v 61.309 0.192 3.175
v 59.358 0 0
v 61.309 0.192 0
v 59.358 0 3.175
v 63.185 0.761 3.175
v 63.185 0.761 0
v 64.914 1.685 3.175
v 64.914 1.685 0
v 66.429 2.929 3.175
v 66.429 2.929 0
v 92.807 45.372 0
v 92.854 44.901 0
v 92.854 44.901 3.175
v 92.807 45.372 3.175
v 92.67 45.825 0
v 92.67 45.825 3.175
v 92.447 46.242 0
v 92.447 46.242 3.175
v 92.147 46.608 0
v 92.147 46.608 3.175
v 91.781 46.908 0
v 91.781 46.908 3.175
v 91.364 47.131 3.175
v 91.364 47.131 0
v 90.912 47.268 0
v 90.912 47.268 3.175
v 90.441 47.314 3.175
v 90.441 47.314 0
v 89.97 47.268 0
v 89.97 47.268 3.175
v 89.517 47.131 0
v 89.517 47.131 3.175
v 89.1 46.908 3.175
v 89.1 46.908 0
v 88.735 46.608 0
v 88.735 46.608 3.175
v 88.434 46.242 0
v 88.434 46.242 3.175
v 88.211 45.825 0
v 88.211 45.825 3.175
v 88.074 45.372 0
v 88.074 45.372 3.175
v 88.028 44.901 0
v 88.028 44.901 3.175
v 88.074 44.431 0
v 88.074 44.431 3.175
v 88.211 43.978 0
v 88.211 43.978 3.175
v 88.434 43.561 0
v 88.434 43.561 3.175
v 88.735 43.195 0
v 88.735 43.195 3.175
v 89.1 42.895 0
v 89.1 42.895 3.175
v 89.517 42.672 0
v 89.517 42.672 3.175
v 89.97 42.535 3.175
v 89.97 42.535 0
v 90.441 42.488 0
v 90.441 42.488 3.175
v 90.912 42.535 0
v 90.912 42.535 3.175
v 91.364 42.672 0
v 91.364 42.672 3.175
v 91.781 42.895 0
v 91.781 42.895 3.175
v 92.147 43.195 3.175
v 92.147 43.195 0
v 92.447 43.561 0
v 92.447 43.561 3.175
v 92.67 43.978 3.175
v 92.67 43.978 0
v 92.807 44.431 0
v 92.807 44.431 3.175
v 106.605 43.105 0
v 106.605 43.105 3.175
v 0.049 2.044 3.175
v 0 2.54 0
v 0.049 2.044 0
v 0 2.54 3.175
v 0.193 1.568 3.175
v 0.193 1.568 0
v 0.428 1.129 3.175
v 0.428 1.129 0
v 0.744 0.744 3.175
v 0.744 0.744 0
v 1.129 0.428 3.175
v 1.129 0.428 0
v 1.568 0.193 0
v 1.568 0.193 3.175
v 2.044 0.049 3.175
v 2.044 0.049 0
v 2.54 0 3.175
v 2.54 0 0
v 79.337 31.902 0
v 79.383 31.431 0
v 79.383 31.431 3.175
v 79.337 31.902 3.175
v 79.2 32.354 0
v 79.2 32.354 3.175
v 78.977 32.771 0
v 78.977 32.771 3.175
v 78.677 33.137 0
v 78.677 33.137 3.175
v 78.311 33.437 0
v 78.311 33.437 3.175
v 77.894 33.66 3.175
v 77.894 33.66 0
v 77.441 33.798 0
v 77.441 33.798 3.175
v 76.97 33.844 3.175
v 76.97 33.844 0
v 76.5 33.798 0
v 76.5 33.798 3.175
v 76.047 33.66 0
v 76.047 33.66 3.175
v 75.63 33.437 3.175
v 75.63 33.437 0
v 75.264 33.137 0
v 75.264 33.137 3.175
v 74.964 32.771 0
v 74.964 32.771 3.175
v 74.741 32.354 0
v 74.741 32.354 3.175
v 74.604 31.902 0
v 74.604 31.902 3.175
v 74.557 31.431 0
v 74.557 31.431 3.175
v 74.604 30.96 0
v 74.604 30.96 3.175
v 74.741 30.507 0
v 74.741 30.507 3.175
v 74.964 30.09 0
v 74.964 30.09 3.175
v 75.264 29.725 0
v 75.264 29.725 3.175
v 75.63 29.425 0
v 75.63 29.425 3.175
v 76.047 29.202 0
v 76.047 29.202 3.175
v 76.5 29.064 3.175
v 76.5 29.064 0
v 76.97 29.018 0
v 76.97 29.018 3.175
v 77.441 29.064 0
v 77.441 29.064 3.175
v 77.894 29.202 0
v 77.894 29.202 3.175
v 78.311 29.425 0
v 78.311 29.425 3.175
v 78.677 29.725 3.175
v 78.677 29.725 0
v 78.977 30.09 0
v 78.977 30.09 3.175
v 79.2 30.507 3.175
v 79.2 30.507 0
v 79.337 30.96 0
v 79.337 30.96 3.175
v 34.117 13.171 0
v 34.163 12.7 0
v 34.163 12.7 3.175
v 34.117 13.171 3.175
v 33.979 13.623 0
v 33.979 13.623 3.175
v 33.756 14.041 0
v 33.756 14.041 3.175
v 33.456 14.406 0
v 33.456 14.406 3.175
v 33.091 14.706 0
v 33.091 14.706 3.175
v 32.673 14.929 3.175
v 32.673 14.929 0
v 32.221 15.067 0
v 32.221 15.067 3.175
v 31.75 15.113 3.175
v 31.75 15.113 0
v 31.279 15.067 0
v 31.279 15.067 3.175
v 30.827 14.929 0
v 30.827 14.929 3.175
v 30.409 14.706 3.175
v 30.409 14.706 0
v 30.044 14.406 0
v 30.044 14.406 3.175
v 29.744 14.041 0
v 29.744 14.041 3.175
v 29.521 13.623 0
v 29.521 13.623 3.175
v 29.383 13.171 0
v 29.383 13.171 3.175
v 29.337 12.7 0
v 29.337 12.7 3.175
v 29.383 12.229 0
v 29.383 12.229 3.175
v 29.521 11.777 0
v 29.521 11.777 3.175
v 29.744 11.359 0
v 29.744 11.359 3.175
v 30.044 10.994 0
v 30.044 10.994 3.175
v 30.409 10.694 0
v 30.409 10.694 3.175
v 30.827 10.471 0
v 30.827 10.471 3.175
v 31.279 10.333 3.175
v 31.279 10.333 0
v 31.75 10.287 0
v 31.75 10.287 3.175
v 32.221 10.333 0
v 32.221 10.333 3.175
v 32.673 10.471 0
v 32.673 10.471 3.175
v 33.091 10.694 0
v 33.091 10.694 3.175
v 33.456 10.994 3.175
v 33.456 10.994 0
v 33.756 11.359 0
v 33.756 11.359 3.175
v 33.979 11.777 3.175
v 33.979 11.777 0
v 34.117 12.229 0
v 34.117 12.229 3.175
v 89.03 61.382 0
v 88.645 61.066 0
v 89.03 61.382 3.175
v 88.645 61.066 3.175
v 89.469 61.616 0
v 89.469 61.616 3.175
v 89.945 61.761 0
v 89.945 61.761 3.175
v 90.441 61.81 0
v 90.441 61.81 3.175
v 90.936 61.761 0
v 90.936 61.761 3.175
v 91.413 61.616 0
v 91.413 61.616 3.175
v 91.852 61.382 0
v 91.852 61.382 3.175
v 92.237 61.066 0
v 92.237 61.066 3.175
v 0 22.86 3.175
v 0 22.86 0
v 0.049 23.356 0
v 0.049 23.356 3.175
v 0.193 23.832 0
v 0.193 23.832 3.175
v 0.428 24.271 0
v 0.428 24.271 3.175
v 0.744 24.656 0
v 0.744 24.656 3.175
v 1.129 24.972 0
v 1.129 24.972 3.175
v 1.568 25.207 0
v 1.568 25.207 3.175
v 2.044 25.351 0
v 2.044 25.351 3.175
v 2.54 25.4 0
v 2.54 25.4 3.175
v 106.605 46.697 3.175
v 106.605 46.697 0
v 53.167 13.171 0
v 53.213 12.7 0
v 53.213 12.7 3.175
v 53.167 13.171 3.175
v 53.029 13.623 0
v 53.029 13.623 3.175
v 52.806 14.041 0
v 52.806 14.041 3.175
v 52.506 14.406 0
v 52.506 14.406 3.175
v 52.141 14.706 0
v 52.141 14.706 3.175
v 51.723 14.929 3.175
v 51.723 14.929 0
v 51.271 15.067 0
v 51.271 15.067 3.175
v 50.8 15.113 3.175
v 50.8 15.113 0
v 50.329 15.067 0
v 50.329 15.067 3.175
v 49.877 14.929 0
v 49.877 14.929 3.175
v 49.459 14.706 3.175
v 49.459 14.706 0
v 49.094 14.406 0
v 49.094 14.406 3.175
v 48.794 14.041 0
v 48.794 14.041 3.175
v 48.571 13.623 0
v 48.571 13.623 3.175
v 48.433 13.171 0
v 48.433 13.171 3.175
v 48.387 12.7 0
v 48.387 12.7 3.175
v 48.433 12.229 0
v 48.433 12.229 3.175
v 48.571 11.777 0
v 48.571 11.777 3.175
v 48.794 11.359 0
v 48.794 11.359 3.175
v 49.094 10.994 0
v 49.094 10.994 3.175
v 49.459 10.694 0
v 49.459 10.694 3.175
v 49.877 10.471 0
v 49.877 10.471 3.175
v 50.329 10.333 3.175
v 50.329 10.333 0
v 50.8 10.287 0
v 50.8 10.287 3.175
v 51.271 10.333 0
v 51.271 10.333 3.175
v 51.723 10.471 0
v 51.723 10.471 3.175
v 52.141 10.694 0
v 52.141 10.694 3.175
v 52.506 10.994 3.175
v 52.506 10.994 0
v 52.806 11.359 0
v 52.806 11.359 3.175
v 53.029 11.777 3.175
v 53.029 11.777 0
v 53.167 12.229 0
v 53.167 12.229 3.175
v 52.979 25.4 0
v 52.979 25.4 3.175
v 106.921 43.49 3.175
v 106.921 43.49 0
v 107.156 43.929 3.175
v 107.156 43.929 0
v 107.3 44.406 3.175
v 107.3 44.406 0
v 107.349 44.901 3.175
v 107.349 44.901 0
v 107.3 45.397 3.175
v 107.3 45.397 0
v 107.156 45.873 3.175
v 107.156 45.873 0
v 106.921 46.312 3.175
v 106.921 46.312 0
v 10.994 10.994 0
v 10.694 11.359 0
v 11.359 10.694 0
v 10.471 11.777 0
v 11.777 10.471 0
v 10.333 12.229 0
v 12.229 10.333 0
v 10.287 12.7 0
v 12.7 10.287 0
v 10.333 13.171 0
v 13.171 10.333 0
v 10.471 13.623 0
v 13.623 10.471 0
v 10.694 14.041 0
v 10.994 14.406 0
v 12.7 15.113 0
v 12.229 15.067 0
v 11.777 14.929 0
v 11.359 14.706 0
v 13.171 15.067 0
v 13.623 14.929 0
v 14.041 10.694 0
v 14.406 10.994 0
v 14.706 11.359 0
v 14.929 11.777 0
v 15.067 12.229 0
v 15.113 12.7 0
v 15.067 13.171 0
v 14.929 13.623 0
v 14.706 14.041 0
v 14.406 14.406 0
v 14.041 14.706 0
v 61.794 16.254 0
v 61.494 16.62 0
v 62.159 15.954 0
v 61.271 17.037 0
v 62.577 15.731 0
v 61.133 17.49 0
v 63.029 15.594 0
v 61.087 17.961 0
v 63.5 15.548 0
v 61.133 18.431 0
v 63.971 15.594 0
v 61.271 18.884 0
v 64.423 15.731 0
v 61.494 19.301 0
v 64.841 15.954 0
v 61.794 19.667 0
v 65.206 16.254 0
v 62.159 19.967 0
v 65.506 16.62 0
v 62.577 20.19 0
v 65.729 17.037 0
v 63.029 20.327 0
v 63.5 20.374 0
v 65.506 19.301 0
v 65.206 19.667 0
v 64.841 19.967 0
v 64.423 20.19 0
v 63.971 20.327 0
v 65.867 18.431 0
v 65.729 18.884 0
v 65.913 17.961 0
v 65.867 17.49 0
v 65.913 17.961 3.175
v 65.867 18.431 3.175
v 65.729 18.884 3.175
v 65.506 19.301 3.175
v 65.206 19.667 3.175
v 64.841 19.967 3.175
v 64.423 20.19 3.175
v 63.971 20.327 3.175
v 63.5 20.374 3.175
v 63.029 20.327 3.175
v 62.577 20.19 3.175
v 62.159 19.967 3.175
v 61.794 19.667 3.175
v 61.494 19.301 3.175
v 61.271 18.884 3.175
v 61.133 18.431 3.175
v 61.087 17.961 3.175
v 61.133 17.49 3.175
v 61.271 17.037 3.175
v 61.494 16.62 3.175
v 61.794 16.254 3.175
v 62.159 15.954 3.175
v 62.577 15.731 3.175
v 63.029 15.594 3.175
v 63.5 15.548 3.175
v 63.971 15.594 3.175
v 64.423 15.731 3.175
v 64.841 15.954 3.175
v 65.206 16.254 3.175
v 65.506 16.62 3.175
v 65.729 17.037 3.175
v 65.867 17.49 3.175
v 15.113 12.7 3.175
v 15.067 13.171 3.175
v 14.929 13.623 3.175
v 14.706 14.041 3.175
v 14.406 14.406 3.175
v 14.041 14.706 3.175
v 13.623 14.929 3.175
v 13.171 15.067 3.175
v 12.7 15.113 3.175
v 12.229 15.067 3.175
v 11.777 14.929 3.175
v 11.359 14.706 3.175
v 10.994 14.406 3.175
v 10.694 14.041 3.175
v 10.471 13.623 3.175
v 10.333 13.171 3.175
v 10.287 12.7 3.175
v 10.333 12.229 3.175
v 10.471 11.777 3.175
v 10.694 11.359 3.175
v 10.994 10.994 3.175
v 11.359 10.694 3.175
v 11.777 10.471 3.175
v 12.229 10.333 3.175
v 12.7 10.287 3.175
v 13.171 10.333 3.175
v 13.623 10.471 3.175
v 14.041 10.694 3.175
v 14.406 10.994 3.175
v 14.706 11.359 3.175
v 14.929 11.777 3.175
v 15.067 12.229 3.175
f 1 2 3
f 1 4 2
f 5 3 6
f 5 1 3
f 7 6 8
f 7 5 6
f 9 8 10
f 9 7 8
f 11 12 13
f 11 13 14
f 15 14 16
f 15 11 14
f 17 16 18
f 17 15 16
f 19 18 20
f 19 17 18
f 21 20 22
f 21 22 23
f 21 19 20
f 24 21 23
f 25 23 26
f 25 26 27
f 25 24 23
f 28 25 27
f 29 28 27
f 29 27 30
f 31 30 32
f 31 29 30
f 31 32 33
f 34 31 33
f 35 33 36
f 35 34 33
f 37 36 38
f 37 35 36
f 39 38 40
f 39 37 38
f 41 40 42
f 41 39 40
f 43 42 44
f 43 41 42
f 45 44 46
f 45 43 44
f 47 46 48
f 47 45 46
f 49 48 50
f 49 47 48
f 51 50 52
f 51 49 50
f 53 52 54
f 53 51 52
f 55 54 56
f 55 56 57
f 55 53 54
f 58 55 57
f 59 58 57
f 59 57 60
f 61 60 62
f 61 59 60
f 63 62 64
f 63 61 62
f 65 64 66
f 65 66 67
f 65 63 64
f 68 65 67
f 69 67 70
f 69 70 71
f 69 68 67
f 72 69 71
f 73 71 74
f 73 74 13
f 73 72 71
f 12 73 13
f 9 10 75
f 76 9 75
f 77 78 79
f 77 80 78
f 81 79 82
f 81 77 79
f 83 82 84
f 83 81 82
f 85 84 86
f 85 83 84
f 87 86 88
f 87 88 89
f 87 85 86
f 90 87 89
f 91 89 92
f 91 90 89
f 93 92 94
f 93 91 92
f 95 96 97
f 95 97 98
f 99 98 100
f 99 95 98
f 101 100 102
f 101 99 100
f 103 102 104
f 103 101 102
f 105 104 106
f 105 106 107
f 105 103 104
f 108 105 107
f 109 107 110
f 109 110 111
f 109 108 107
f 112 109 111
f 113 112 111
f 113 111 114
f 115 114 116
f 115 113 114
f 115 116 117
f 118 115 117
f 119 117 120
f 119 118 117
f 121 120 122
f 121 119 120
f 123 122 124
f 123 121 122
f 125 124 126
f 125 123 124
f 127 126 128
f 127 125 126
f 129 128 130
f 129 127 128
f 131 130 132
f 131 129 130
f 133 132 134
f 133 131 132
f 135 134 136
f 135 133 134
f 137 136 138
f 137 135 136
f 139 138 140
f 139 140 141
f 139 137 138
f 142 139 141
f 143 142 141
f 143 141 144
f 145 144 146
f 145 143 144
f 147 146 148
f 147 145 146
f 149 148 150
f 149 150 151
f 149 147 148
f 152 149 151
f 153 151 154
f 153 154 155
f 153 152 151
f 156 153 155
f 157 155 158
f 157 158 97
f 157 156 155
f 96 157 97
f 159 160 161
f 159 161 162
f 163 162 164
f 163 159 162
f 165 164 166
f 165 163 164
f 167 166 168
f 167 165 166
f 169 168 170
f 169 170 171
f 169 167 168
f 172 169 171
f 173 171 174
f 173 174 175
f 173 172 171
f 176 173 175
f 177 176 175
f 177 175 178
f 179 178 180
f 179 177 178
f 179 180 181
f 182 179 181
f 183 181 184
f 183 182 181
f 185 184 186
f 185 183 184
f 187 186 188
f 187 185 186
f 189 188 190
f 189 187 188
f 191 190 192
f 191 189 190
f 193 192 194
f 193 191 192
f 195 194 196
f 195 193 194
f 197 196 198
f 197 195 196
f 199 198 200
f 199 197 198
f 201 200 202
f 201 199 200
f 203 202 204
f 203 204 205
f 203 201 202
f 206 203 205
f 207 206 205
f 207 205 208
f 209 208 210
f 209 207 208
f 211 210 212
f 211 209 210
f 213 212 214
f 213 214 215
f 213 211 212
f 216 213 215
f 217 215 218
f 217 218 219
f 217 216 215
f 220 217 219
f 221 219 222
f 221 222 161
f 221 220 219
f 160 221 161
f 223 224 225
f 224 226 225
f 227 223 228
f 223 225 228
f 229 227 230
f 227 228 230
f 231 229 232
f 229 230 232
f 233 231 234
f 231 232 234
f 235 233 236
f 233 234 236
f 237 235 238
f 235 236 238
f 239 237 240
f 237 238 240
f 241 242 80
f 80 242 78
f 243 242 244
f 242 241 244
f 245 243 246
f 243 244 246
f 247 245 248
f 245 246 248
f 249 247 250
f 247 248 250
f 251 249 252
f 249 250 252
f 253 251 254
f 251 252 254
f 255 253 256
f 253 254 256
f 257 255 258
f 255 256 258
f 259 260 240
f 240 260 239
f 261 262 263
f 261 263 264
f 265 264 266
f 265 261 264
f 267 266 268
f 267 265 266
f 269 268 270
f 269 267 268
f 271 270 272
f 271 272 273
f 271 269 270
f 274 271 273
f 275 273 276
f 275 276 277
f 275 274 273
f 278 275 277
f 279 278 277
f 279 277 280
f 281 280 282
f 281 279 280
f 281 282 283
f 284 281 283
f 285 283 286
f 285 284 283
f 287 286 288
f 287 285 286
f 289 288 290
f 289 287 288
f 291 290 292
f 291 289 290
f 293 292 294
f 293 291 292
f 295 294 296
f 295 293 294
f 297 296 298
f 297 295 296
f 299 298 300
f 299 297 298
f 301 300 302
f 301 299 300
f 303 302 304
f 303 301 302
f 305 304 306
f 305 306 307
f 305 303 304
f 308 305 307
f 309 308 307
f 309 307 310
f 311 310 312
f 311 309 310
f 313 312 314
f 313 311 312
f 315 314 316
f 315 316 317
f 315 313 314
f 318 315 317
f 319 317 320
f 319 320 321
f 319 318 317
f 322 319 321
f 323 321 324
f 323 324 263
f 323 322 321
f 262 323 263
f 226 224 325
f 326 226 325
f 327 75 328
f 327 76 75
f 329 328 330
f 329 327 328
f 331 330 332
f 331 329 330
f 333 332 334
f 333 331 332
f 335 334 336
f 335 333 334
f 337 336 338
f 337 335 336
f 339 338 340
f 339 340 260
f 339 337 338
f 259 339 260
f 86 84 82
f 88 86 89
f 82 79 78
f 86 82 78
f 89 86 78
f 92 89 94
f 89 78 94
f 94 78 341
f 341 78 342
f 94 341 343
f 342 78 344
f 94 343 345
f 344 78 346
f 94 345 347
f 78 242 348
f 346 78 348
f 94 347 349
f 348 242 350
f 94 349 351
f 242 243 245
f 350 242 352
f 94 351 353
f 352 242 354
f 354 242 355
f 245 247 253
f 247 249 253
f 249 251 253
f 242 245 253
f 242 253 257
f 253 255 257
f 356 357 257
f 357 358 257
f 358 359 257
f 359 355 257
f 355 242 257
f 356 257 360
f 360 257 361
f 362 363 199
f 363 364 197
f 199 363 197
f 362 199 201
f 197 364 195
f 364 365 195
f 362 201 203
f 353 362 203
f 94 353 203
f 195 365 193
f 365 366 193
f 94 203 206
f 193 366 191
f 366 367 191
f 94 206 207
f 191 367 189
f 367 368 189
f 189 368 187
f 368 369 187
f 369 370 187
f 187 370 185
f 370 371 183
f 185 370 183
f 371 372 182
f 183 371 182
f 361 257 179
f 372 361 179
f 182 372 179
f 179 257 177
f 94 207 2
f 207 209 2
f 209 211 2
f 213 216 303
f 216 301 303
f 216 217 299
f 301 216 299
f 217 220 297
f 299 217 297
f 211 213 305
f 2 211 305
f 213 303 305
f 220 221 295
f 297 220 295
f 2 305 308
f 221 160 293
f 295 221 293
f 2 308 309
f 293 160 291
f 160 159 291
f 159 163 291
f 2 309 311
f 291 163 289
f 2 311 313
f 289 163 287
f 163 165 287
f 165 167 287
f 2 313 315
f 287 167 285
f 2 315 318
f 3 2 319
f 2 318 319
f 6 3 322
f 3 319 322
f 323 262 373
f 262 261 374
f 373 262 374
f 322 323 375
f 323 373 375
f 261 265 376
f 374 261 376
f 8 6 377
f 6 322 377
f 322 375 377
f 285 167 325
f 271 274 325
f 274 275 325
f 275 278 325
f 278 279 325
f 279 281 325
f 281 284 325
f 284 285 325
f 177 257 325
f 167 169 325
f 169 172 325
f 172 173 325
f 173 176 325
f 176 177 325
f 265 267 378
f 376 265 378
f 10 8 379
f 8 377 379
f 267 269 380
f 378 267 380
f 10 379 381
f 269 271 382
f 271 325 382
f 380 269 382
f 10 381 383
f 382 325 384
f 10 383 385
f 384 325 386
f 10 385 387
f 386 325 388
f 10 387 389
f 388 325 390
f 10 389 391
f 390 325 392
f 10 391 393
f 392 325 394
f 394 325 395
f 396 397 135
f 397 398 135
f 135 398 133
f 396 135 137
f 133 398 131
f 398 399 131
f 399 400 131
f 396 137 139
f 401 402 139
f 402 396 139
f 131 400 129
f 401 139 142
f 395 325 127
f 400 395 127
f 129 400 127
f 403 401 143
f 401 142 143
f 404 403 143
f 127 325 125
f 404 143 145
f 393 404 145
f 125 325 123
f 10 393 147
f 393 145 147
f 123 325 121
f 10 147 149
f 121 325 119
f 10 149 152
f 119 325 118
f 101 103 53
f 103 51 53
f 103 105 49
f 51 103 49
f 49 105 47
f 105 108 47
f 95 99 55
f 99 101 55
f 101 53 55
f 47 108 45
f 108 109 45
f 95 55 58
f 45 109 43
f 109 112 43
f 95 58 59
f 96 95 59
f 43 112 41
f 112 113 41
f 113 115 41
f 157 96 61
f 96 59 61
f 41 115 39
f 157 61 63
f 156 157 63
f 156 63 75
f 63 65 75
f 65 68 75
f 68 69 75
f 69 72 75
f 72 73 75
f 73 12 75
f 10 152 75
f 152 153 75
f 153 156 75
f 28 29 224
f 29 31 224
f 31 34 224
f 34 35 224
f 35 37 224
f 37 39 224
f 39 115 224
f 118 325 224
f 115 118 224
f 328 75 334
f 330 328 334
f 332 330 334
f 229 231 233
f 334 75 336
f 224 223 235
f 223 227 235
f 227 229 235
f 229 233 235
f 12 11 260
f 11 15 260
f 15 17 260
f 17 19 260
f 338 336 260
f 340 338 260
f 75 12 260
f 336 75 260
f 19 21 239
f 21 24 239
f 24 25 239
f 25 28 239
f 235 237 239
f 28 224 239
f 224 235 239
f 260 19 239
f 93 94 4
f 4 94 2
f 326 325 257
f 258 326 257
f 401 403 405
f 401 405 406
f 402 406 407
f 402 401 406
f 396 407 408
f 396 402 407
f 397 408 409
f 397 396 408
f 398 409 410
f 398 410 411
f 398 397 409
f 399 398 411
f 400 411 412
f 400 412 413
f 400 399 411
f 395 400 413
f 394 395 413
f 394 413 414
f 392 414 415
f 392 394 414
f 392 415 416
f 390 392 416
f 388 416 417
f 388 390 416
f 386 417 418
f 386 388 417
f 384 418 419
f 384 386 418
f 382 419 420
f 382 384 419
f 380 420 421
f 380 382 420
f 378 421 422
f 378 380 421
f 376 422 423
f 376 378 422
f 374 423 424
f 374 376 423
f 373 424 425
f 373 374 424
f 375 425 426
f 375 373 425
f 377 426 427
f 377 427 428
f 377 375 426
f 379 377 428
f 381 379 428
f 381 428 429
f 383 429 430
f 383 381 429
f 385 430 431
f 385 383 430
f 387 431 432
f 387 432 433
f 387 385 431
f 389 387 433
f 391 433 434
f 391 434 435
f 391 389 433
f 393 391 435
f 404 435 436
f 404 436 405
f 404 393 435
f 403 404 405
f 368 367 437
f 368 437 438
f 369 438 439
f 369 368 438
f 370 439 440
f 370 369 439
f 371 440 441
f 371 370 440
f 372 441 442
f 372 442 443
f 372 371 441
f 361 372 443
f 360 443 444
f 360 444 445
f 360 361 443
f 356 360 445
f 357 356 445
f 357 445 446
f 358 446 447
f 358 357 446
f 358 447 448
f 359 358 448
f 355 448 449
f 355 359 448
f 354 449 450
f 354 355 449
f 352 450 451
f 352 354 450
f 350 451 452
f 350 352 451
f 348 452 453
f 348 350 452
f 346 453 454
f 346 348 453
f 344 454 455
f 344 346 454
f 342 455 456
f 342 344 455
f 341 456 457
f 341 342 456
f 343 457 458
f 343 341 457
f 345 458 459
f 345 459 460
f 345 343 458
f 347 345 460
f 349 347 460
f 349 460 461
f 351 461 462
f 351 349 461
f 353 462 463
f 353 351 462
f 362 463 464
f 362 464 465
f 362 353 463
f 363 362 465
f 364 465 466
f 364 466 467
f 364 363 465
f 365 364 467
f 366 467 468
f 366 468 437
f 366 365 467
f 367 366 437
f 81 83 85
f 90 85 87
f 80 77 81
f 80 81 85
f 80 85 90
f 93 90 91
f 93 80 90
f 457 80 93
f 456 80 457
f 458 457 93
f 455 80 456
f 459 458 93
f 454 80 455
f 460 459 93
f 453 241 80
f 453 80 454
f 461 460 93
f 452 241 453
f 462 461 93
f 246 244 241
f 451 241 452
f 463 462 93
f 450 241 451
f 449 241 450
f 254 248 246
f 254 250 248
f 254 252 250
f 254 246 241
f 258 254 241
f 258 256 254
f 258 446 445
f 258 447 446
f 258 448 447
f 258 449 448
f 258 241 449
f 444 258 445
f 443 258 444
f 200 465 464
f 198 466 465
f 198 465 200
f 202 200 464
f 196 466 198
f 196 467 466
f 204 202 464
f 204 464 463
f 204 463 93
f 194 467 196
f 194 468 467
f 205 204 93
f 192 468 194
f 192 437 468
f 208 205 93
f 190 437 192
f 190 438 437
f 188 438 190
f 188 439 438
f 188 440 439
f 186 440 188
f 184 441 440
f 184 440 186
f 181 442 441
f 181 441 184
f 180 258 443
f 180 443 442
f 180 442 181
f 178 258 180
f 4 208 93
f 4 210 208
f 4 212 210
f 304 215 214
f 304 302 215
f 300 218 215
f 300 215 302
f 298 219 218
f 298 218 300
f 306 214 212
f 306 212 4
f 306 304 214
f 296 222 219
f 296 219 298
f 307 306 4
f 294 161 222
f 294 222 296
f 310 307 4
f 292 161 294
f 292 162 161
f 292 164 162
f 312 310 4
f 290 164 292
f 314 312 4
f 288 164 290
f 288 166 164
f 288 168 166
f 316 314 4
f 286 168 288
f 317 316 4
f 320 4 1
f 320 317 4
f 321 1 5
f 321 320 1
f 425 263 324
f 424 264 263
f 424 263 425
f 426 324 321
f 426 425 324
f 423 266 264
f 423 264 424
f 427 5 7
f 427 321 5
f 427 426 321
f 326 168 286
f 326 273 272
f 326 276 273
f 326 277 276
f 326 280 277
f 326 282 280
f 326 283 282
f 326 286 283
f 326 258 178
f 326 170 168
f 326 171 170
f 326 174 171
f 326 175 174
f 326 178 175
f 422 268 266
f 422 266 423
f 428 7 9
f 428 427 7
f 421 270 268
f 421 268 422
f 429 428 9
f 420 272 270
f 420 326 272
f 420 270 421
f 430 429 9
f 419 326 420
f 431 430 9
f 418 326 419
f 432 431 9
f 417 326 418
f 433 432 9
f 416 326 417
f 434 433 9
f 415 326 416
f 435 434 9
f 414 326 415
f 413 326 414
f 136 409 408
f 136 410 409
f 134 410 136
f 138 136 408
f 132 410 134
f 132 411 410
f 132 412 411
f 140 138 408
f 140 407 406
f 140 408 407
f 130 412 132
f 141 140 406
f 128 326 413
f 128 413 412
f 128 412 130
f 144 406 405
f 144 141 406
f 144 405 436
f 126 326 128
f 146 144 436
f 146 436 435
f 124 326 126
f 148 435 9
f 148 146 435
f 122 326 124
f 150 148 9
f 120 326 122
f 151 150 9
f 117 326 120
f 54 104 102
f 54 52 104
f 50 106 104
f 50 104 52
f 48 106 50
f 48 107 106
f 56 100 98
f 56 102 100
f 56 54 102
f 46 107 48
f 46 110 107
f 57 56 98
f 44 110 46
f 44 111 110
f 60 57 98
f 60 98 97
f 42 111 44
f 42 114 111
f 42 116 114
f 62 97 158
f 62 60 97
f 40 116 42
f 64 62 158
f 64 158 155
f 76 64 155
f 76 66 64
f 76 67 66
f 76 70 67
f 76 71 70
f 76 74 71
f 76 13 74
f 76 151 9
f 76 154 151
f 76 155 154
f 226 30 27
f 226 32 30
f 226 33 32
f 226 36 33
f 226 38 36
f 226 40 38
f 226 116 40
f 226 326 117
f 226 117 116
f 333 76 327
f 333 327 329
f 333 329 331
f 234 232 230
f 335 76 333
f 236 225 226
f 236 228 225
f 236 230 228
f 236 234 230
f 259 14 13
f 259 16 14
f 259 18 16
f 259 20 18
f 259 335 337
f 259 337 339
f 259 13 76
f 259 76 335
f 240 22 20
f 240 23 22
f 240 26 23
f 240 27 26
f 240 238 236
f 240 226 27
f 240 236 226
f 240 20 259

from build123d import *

# Parameters (mm, degrees)
SKETCH1_R           = 2.413
BOSS_EXTRUDE1_DEPTH = 3.175
FILLET1_R           = 10
FILLET2_R           = 2.54
FILLET3_R           = 2.54


with BuildPart() as part:
    # Sketch1 → Boss-Extrude1 (new body)
    with BuildSketch(Plane.XY):
        Polygon((0, 0), (63.5, 0), (108.401280605, 44.901280605), (90.440768363, 62.861792847), (52.978975516, 25.4), (0, 25.4), align=None)
        with Locations((12.7, 12.7)):
            Circle(SKETCH1_R, mode=Mode.SUBTRACT)
        with Locations((31.75, 12.7)):
            Circle(SKETCH1_R, mode=Mode.SUBTRACT)
        with Locations((76.970384182, 31.430896424)):
            Circle(SKETCH1_R, mode=Mode.SUBTRACT)
        with Locations((90.440768363, 44.901280605)):
            Circle(SKETCH1_R, mode=Mode.SUBTRACT)
        with Locations((50.8, 12.7)):
            Circle(SKETCH1_R, mode=Mode.SUBTRACT)
        with Locations((63.5, 17.960512242)):
            Circle(SKETCH1_R, mode=Mode.SUBTRACT)
    extrude(amount=BOSS_EXTRUDE1_DEPTH)

    # Fillet1
    fillet1_edges = [part.edges().sort_by_distance(p)[0] for p in [
        (63.5, 0, 1.5875),
    ]]
    fillet(fillet1_edges, radius=FILLET1_R)

    # Fillet2
    fillet2_edges = [part.edges().sort_by_distance(p)[0] for p in [
        (0, 25.4, 1.5875),
    ]]
    fillet(fillet2_edges, radius=FILLET2_R)

    # Fillet3
    fillet3_edges = [part.edges().sort_by_distance(p)[0] for p in [
        (90.440768363, 62.861792847, 1.5875),
        (108.401280605, 44.901280605, 1.5875),
        (0, 0, 1.5875),
    ]]
    fillet(fillet3_edges, radius=FILLET3_R)


solid = part.part
